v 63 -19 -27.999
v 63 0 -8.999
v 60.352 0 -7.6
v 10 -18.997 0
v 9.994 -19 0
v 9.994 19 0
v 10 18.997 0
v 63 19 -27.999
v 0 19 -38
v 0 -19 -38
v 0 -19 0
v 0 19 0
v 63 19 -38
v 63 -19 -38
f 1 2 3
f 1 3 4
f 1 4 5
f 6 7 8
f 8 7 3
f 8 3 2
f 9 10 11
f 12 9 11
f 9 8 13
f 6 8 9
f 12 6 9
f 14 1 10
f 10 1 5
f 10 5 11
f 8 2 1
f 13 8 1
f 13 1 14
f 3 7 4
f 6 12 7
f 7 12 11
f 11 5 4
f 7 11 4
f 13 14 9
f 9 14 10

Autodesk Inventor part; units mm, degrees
ref_plane "YZ Plane" through (0, 0, 0) normal (1, 0, 0) x (0, 1, 0)
ref_plane "XZ Plane" through (0, 0, 0) normal (0, 1, 0) x (-1, 0, 0)
sketch "草圖1" plane through (0, 0, 0) normal (0, 1, 0) x (-1, 0, 0)
  line L0 (0, 0) -> (-63, 0)
  line L1 (-63, 0) -> (-63, -38)
  line L2 (-63, -38) -> (0, -38)
  line L3 (0, -38) -> (0, 0)
  dimension "d0" = 63
  dimension "d1" = 38
extrude "擠出1" add sketch "草圖1" along normal mid plane 38
sketch "草圖2" plane through (0, 19, 0) normal (0, 1, 0) x (1, 0, 0)
  line L0 (0, 0) -> (63, 0) projected
  line L1 (10, 0) -> (63, 8)
  line L2 (63, 0) -> (63, 38) projected
  dimension "d4" = 10
  dimension "d5" = 30
extrude "擠出2" cut sketch "草圖2" against normal blind 40
sketch "草圖3" plane through (63, -19, -38) normal (1, 0, 0) x (0, 0, -1)
  line L0 (-30, 18) -> (-10, 38)
  line L1 (0, 38) -> (-38, 38) projected
  line L2 (-30, 38) -> (-30, 0) projected
  point P0 (-38, 19)
  dimension "d8" = 20
  dimension "d9" = 20
ref_plane "工作平面1" through (10, 19, 0) normal (-0.3499, -0.6624, -0.6624) x (0.8842, 0, -0.4671)
sketch "草圖4" plane through (10, 19, 0) normal (-0.3499, -0.6624, -0.6624) x (0.8842, 0, -0.4671)
  line L0 (-15.1543, -12.3218) -> (93.717, -12.3218)
  line L1 (93.717, -12.3218) -> (93.717, 28.8166)
  line L2 (93.717, 28.8166) -> (-15.1543, 28.8166)
  line L3 (-15.1543, 28.8166) -> (-15.1543, -12.3218)
  point P0 (-8.8419, 11.1397)
extrude "擠出3" cut sketch "草圖4" against normal blind 40
mirror "鏡射1" about plane through (0, 0, 0) normal (0, 1, 0) of "擠出3"
properties part number "29"
